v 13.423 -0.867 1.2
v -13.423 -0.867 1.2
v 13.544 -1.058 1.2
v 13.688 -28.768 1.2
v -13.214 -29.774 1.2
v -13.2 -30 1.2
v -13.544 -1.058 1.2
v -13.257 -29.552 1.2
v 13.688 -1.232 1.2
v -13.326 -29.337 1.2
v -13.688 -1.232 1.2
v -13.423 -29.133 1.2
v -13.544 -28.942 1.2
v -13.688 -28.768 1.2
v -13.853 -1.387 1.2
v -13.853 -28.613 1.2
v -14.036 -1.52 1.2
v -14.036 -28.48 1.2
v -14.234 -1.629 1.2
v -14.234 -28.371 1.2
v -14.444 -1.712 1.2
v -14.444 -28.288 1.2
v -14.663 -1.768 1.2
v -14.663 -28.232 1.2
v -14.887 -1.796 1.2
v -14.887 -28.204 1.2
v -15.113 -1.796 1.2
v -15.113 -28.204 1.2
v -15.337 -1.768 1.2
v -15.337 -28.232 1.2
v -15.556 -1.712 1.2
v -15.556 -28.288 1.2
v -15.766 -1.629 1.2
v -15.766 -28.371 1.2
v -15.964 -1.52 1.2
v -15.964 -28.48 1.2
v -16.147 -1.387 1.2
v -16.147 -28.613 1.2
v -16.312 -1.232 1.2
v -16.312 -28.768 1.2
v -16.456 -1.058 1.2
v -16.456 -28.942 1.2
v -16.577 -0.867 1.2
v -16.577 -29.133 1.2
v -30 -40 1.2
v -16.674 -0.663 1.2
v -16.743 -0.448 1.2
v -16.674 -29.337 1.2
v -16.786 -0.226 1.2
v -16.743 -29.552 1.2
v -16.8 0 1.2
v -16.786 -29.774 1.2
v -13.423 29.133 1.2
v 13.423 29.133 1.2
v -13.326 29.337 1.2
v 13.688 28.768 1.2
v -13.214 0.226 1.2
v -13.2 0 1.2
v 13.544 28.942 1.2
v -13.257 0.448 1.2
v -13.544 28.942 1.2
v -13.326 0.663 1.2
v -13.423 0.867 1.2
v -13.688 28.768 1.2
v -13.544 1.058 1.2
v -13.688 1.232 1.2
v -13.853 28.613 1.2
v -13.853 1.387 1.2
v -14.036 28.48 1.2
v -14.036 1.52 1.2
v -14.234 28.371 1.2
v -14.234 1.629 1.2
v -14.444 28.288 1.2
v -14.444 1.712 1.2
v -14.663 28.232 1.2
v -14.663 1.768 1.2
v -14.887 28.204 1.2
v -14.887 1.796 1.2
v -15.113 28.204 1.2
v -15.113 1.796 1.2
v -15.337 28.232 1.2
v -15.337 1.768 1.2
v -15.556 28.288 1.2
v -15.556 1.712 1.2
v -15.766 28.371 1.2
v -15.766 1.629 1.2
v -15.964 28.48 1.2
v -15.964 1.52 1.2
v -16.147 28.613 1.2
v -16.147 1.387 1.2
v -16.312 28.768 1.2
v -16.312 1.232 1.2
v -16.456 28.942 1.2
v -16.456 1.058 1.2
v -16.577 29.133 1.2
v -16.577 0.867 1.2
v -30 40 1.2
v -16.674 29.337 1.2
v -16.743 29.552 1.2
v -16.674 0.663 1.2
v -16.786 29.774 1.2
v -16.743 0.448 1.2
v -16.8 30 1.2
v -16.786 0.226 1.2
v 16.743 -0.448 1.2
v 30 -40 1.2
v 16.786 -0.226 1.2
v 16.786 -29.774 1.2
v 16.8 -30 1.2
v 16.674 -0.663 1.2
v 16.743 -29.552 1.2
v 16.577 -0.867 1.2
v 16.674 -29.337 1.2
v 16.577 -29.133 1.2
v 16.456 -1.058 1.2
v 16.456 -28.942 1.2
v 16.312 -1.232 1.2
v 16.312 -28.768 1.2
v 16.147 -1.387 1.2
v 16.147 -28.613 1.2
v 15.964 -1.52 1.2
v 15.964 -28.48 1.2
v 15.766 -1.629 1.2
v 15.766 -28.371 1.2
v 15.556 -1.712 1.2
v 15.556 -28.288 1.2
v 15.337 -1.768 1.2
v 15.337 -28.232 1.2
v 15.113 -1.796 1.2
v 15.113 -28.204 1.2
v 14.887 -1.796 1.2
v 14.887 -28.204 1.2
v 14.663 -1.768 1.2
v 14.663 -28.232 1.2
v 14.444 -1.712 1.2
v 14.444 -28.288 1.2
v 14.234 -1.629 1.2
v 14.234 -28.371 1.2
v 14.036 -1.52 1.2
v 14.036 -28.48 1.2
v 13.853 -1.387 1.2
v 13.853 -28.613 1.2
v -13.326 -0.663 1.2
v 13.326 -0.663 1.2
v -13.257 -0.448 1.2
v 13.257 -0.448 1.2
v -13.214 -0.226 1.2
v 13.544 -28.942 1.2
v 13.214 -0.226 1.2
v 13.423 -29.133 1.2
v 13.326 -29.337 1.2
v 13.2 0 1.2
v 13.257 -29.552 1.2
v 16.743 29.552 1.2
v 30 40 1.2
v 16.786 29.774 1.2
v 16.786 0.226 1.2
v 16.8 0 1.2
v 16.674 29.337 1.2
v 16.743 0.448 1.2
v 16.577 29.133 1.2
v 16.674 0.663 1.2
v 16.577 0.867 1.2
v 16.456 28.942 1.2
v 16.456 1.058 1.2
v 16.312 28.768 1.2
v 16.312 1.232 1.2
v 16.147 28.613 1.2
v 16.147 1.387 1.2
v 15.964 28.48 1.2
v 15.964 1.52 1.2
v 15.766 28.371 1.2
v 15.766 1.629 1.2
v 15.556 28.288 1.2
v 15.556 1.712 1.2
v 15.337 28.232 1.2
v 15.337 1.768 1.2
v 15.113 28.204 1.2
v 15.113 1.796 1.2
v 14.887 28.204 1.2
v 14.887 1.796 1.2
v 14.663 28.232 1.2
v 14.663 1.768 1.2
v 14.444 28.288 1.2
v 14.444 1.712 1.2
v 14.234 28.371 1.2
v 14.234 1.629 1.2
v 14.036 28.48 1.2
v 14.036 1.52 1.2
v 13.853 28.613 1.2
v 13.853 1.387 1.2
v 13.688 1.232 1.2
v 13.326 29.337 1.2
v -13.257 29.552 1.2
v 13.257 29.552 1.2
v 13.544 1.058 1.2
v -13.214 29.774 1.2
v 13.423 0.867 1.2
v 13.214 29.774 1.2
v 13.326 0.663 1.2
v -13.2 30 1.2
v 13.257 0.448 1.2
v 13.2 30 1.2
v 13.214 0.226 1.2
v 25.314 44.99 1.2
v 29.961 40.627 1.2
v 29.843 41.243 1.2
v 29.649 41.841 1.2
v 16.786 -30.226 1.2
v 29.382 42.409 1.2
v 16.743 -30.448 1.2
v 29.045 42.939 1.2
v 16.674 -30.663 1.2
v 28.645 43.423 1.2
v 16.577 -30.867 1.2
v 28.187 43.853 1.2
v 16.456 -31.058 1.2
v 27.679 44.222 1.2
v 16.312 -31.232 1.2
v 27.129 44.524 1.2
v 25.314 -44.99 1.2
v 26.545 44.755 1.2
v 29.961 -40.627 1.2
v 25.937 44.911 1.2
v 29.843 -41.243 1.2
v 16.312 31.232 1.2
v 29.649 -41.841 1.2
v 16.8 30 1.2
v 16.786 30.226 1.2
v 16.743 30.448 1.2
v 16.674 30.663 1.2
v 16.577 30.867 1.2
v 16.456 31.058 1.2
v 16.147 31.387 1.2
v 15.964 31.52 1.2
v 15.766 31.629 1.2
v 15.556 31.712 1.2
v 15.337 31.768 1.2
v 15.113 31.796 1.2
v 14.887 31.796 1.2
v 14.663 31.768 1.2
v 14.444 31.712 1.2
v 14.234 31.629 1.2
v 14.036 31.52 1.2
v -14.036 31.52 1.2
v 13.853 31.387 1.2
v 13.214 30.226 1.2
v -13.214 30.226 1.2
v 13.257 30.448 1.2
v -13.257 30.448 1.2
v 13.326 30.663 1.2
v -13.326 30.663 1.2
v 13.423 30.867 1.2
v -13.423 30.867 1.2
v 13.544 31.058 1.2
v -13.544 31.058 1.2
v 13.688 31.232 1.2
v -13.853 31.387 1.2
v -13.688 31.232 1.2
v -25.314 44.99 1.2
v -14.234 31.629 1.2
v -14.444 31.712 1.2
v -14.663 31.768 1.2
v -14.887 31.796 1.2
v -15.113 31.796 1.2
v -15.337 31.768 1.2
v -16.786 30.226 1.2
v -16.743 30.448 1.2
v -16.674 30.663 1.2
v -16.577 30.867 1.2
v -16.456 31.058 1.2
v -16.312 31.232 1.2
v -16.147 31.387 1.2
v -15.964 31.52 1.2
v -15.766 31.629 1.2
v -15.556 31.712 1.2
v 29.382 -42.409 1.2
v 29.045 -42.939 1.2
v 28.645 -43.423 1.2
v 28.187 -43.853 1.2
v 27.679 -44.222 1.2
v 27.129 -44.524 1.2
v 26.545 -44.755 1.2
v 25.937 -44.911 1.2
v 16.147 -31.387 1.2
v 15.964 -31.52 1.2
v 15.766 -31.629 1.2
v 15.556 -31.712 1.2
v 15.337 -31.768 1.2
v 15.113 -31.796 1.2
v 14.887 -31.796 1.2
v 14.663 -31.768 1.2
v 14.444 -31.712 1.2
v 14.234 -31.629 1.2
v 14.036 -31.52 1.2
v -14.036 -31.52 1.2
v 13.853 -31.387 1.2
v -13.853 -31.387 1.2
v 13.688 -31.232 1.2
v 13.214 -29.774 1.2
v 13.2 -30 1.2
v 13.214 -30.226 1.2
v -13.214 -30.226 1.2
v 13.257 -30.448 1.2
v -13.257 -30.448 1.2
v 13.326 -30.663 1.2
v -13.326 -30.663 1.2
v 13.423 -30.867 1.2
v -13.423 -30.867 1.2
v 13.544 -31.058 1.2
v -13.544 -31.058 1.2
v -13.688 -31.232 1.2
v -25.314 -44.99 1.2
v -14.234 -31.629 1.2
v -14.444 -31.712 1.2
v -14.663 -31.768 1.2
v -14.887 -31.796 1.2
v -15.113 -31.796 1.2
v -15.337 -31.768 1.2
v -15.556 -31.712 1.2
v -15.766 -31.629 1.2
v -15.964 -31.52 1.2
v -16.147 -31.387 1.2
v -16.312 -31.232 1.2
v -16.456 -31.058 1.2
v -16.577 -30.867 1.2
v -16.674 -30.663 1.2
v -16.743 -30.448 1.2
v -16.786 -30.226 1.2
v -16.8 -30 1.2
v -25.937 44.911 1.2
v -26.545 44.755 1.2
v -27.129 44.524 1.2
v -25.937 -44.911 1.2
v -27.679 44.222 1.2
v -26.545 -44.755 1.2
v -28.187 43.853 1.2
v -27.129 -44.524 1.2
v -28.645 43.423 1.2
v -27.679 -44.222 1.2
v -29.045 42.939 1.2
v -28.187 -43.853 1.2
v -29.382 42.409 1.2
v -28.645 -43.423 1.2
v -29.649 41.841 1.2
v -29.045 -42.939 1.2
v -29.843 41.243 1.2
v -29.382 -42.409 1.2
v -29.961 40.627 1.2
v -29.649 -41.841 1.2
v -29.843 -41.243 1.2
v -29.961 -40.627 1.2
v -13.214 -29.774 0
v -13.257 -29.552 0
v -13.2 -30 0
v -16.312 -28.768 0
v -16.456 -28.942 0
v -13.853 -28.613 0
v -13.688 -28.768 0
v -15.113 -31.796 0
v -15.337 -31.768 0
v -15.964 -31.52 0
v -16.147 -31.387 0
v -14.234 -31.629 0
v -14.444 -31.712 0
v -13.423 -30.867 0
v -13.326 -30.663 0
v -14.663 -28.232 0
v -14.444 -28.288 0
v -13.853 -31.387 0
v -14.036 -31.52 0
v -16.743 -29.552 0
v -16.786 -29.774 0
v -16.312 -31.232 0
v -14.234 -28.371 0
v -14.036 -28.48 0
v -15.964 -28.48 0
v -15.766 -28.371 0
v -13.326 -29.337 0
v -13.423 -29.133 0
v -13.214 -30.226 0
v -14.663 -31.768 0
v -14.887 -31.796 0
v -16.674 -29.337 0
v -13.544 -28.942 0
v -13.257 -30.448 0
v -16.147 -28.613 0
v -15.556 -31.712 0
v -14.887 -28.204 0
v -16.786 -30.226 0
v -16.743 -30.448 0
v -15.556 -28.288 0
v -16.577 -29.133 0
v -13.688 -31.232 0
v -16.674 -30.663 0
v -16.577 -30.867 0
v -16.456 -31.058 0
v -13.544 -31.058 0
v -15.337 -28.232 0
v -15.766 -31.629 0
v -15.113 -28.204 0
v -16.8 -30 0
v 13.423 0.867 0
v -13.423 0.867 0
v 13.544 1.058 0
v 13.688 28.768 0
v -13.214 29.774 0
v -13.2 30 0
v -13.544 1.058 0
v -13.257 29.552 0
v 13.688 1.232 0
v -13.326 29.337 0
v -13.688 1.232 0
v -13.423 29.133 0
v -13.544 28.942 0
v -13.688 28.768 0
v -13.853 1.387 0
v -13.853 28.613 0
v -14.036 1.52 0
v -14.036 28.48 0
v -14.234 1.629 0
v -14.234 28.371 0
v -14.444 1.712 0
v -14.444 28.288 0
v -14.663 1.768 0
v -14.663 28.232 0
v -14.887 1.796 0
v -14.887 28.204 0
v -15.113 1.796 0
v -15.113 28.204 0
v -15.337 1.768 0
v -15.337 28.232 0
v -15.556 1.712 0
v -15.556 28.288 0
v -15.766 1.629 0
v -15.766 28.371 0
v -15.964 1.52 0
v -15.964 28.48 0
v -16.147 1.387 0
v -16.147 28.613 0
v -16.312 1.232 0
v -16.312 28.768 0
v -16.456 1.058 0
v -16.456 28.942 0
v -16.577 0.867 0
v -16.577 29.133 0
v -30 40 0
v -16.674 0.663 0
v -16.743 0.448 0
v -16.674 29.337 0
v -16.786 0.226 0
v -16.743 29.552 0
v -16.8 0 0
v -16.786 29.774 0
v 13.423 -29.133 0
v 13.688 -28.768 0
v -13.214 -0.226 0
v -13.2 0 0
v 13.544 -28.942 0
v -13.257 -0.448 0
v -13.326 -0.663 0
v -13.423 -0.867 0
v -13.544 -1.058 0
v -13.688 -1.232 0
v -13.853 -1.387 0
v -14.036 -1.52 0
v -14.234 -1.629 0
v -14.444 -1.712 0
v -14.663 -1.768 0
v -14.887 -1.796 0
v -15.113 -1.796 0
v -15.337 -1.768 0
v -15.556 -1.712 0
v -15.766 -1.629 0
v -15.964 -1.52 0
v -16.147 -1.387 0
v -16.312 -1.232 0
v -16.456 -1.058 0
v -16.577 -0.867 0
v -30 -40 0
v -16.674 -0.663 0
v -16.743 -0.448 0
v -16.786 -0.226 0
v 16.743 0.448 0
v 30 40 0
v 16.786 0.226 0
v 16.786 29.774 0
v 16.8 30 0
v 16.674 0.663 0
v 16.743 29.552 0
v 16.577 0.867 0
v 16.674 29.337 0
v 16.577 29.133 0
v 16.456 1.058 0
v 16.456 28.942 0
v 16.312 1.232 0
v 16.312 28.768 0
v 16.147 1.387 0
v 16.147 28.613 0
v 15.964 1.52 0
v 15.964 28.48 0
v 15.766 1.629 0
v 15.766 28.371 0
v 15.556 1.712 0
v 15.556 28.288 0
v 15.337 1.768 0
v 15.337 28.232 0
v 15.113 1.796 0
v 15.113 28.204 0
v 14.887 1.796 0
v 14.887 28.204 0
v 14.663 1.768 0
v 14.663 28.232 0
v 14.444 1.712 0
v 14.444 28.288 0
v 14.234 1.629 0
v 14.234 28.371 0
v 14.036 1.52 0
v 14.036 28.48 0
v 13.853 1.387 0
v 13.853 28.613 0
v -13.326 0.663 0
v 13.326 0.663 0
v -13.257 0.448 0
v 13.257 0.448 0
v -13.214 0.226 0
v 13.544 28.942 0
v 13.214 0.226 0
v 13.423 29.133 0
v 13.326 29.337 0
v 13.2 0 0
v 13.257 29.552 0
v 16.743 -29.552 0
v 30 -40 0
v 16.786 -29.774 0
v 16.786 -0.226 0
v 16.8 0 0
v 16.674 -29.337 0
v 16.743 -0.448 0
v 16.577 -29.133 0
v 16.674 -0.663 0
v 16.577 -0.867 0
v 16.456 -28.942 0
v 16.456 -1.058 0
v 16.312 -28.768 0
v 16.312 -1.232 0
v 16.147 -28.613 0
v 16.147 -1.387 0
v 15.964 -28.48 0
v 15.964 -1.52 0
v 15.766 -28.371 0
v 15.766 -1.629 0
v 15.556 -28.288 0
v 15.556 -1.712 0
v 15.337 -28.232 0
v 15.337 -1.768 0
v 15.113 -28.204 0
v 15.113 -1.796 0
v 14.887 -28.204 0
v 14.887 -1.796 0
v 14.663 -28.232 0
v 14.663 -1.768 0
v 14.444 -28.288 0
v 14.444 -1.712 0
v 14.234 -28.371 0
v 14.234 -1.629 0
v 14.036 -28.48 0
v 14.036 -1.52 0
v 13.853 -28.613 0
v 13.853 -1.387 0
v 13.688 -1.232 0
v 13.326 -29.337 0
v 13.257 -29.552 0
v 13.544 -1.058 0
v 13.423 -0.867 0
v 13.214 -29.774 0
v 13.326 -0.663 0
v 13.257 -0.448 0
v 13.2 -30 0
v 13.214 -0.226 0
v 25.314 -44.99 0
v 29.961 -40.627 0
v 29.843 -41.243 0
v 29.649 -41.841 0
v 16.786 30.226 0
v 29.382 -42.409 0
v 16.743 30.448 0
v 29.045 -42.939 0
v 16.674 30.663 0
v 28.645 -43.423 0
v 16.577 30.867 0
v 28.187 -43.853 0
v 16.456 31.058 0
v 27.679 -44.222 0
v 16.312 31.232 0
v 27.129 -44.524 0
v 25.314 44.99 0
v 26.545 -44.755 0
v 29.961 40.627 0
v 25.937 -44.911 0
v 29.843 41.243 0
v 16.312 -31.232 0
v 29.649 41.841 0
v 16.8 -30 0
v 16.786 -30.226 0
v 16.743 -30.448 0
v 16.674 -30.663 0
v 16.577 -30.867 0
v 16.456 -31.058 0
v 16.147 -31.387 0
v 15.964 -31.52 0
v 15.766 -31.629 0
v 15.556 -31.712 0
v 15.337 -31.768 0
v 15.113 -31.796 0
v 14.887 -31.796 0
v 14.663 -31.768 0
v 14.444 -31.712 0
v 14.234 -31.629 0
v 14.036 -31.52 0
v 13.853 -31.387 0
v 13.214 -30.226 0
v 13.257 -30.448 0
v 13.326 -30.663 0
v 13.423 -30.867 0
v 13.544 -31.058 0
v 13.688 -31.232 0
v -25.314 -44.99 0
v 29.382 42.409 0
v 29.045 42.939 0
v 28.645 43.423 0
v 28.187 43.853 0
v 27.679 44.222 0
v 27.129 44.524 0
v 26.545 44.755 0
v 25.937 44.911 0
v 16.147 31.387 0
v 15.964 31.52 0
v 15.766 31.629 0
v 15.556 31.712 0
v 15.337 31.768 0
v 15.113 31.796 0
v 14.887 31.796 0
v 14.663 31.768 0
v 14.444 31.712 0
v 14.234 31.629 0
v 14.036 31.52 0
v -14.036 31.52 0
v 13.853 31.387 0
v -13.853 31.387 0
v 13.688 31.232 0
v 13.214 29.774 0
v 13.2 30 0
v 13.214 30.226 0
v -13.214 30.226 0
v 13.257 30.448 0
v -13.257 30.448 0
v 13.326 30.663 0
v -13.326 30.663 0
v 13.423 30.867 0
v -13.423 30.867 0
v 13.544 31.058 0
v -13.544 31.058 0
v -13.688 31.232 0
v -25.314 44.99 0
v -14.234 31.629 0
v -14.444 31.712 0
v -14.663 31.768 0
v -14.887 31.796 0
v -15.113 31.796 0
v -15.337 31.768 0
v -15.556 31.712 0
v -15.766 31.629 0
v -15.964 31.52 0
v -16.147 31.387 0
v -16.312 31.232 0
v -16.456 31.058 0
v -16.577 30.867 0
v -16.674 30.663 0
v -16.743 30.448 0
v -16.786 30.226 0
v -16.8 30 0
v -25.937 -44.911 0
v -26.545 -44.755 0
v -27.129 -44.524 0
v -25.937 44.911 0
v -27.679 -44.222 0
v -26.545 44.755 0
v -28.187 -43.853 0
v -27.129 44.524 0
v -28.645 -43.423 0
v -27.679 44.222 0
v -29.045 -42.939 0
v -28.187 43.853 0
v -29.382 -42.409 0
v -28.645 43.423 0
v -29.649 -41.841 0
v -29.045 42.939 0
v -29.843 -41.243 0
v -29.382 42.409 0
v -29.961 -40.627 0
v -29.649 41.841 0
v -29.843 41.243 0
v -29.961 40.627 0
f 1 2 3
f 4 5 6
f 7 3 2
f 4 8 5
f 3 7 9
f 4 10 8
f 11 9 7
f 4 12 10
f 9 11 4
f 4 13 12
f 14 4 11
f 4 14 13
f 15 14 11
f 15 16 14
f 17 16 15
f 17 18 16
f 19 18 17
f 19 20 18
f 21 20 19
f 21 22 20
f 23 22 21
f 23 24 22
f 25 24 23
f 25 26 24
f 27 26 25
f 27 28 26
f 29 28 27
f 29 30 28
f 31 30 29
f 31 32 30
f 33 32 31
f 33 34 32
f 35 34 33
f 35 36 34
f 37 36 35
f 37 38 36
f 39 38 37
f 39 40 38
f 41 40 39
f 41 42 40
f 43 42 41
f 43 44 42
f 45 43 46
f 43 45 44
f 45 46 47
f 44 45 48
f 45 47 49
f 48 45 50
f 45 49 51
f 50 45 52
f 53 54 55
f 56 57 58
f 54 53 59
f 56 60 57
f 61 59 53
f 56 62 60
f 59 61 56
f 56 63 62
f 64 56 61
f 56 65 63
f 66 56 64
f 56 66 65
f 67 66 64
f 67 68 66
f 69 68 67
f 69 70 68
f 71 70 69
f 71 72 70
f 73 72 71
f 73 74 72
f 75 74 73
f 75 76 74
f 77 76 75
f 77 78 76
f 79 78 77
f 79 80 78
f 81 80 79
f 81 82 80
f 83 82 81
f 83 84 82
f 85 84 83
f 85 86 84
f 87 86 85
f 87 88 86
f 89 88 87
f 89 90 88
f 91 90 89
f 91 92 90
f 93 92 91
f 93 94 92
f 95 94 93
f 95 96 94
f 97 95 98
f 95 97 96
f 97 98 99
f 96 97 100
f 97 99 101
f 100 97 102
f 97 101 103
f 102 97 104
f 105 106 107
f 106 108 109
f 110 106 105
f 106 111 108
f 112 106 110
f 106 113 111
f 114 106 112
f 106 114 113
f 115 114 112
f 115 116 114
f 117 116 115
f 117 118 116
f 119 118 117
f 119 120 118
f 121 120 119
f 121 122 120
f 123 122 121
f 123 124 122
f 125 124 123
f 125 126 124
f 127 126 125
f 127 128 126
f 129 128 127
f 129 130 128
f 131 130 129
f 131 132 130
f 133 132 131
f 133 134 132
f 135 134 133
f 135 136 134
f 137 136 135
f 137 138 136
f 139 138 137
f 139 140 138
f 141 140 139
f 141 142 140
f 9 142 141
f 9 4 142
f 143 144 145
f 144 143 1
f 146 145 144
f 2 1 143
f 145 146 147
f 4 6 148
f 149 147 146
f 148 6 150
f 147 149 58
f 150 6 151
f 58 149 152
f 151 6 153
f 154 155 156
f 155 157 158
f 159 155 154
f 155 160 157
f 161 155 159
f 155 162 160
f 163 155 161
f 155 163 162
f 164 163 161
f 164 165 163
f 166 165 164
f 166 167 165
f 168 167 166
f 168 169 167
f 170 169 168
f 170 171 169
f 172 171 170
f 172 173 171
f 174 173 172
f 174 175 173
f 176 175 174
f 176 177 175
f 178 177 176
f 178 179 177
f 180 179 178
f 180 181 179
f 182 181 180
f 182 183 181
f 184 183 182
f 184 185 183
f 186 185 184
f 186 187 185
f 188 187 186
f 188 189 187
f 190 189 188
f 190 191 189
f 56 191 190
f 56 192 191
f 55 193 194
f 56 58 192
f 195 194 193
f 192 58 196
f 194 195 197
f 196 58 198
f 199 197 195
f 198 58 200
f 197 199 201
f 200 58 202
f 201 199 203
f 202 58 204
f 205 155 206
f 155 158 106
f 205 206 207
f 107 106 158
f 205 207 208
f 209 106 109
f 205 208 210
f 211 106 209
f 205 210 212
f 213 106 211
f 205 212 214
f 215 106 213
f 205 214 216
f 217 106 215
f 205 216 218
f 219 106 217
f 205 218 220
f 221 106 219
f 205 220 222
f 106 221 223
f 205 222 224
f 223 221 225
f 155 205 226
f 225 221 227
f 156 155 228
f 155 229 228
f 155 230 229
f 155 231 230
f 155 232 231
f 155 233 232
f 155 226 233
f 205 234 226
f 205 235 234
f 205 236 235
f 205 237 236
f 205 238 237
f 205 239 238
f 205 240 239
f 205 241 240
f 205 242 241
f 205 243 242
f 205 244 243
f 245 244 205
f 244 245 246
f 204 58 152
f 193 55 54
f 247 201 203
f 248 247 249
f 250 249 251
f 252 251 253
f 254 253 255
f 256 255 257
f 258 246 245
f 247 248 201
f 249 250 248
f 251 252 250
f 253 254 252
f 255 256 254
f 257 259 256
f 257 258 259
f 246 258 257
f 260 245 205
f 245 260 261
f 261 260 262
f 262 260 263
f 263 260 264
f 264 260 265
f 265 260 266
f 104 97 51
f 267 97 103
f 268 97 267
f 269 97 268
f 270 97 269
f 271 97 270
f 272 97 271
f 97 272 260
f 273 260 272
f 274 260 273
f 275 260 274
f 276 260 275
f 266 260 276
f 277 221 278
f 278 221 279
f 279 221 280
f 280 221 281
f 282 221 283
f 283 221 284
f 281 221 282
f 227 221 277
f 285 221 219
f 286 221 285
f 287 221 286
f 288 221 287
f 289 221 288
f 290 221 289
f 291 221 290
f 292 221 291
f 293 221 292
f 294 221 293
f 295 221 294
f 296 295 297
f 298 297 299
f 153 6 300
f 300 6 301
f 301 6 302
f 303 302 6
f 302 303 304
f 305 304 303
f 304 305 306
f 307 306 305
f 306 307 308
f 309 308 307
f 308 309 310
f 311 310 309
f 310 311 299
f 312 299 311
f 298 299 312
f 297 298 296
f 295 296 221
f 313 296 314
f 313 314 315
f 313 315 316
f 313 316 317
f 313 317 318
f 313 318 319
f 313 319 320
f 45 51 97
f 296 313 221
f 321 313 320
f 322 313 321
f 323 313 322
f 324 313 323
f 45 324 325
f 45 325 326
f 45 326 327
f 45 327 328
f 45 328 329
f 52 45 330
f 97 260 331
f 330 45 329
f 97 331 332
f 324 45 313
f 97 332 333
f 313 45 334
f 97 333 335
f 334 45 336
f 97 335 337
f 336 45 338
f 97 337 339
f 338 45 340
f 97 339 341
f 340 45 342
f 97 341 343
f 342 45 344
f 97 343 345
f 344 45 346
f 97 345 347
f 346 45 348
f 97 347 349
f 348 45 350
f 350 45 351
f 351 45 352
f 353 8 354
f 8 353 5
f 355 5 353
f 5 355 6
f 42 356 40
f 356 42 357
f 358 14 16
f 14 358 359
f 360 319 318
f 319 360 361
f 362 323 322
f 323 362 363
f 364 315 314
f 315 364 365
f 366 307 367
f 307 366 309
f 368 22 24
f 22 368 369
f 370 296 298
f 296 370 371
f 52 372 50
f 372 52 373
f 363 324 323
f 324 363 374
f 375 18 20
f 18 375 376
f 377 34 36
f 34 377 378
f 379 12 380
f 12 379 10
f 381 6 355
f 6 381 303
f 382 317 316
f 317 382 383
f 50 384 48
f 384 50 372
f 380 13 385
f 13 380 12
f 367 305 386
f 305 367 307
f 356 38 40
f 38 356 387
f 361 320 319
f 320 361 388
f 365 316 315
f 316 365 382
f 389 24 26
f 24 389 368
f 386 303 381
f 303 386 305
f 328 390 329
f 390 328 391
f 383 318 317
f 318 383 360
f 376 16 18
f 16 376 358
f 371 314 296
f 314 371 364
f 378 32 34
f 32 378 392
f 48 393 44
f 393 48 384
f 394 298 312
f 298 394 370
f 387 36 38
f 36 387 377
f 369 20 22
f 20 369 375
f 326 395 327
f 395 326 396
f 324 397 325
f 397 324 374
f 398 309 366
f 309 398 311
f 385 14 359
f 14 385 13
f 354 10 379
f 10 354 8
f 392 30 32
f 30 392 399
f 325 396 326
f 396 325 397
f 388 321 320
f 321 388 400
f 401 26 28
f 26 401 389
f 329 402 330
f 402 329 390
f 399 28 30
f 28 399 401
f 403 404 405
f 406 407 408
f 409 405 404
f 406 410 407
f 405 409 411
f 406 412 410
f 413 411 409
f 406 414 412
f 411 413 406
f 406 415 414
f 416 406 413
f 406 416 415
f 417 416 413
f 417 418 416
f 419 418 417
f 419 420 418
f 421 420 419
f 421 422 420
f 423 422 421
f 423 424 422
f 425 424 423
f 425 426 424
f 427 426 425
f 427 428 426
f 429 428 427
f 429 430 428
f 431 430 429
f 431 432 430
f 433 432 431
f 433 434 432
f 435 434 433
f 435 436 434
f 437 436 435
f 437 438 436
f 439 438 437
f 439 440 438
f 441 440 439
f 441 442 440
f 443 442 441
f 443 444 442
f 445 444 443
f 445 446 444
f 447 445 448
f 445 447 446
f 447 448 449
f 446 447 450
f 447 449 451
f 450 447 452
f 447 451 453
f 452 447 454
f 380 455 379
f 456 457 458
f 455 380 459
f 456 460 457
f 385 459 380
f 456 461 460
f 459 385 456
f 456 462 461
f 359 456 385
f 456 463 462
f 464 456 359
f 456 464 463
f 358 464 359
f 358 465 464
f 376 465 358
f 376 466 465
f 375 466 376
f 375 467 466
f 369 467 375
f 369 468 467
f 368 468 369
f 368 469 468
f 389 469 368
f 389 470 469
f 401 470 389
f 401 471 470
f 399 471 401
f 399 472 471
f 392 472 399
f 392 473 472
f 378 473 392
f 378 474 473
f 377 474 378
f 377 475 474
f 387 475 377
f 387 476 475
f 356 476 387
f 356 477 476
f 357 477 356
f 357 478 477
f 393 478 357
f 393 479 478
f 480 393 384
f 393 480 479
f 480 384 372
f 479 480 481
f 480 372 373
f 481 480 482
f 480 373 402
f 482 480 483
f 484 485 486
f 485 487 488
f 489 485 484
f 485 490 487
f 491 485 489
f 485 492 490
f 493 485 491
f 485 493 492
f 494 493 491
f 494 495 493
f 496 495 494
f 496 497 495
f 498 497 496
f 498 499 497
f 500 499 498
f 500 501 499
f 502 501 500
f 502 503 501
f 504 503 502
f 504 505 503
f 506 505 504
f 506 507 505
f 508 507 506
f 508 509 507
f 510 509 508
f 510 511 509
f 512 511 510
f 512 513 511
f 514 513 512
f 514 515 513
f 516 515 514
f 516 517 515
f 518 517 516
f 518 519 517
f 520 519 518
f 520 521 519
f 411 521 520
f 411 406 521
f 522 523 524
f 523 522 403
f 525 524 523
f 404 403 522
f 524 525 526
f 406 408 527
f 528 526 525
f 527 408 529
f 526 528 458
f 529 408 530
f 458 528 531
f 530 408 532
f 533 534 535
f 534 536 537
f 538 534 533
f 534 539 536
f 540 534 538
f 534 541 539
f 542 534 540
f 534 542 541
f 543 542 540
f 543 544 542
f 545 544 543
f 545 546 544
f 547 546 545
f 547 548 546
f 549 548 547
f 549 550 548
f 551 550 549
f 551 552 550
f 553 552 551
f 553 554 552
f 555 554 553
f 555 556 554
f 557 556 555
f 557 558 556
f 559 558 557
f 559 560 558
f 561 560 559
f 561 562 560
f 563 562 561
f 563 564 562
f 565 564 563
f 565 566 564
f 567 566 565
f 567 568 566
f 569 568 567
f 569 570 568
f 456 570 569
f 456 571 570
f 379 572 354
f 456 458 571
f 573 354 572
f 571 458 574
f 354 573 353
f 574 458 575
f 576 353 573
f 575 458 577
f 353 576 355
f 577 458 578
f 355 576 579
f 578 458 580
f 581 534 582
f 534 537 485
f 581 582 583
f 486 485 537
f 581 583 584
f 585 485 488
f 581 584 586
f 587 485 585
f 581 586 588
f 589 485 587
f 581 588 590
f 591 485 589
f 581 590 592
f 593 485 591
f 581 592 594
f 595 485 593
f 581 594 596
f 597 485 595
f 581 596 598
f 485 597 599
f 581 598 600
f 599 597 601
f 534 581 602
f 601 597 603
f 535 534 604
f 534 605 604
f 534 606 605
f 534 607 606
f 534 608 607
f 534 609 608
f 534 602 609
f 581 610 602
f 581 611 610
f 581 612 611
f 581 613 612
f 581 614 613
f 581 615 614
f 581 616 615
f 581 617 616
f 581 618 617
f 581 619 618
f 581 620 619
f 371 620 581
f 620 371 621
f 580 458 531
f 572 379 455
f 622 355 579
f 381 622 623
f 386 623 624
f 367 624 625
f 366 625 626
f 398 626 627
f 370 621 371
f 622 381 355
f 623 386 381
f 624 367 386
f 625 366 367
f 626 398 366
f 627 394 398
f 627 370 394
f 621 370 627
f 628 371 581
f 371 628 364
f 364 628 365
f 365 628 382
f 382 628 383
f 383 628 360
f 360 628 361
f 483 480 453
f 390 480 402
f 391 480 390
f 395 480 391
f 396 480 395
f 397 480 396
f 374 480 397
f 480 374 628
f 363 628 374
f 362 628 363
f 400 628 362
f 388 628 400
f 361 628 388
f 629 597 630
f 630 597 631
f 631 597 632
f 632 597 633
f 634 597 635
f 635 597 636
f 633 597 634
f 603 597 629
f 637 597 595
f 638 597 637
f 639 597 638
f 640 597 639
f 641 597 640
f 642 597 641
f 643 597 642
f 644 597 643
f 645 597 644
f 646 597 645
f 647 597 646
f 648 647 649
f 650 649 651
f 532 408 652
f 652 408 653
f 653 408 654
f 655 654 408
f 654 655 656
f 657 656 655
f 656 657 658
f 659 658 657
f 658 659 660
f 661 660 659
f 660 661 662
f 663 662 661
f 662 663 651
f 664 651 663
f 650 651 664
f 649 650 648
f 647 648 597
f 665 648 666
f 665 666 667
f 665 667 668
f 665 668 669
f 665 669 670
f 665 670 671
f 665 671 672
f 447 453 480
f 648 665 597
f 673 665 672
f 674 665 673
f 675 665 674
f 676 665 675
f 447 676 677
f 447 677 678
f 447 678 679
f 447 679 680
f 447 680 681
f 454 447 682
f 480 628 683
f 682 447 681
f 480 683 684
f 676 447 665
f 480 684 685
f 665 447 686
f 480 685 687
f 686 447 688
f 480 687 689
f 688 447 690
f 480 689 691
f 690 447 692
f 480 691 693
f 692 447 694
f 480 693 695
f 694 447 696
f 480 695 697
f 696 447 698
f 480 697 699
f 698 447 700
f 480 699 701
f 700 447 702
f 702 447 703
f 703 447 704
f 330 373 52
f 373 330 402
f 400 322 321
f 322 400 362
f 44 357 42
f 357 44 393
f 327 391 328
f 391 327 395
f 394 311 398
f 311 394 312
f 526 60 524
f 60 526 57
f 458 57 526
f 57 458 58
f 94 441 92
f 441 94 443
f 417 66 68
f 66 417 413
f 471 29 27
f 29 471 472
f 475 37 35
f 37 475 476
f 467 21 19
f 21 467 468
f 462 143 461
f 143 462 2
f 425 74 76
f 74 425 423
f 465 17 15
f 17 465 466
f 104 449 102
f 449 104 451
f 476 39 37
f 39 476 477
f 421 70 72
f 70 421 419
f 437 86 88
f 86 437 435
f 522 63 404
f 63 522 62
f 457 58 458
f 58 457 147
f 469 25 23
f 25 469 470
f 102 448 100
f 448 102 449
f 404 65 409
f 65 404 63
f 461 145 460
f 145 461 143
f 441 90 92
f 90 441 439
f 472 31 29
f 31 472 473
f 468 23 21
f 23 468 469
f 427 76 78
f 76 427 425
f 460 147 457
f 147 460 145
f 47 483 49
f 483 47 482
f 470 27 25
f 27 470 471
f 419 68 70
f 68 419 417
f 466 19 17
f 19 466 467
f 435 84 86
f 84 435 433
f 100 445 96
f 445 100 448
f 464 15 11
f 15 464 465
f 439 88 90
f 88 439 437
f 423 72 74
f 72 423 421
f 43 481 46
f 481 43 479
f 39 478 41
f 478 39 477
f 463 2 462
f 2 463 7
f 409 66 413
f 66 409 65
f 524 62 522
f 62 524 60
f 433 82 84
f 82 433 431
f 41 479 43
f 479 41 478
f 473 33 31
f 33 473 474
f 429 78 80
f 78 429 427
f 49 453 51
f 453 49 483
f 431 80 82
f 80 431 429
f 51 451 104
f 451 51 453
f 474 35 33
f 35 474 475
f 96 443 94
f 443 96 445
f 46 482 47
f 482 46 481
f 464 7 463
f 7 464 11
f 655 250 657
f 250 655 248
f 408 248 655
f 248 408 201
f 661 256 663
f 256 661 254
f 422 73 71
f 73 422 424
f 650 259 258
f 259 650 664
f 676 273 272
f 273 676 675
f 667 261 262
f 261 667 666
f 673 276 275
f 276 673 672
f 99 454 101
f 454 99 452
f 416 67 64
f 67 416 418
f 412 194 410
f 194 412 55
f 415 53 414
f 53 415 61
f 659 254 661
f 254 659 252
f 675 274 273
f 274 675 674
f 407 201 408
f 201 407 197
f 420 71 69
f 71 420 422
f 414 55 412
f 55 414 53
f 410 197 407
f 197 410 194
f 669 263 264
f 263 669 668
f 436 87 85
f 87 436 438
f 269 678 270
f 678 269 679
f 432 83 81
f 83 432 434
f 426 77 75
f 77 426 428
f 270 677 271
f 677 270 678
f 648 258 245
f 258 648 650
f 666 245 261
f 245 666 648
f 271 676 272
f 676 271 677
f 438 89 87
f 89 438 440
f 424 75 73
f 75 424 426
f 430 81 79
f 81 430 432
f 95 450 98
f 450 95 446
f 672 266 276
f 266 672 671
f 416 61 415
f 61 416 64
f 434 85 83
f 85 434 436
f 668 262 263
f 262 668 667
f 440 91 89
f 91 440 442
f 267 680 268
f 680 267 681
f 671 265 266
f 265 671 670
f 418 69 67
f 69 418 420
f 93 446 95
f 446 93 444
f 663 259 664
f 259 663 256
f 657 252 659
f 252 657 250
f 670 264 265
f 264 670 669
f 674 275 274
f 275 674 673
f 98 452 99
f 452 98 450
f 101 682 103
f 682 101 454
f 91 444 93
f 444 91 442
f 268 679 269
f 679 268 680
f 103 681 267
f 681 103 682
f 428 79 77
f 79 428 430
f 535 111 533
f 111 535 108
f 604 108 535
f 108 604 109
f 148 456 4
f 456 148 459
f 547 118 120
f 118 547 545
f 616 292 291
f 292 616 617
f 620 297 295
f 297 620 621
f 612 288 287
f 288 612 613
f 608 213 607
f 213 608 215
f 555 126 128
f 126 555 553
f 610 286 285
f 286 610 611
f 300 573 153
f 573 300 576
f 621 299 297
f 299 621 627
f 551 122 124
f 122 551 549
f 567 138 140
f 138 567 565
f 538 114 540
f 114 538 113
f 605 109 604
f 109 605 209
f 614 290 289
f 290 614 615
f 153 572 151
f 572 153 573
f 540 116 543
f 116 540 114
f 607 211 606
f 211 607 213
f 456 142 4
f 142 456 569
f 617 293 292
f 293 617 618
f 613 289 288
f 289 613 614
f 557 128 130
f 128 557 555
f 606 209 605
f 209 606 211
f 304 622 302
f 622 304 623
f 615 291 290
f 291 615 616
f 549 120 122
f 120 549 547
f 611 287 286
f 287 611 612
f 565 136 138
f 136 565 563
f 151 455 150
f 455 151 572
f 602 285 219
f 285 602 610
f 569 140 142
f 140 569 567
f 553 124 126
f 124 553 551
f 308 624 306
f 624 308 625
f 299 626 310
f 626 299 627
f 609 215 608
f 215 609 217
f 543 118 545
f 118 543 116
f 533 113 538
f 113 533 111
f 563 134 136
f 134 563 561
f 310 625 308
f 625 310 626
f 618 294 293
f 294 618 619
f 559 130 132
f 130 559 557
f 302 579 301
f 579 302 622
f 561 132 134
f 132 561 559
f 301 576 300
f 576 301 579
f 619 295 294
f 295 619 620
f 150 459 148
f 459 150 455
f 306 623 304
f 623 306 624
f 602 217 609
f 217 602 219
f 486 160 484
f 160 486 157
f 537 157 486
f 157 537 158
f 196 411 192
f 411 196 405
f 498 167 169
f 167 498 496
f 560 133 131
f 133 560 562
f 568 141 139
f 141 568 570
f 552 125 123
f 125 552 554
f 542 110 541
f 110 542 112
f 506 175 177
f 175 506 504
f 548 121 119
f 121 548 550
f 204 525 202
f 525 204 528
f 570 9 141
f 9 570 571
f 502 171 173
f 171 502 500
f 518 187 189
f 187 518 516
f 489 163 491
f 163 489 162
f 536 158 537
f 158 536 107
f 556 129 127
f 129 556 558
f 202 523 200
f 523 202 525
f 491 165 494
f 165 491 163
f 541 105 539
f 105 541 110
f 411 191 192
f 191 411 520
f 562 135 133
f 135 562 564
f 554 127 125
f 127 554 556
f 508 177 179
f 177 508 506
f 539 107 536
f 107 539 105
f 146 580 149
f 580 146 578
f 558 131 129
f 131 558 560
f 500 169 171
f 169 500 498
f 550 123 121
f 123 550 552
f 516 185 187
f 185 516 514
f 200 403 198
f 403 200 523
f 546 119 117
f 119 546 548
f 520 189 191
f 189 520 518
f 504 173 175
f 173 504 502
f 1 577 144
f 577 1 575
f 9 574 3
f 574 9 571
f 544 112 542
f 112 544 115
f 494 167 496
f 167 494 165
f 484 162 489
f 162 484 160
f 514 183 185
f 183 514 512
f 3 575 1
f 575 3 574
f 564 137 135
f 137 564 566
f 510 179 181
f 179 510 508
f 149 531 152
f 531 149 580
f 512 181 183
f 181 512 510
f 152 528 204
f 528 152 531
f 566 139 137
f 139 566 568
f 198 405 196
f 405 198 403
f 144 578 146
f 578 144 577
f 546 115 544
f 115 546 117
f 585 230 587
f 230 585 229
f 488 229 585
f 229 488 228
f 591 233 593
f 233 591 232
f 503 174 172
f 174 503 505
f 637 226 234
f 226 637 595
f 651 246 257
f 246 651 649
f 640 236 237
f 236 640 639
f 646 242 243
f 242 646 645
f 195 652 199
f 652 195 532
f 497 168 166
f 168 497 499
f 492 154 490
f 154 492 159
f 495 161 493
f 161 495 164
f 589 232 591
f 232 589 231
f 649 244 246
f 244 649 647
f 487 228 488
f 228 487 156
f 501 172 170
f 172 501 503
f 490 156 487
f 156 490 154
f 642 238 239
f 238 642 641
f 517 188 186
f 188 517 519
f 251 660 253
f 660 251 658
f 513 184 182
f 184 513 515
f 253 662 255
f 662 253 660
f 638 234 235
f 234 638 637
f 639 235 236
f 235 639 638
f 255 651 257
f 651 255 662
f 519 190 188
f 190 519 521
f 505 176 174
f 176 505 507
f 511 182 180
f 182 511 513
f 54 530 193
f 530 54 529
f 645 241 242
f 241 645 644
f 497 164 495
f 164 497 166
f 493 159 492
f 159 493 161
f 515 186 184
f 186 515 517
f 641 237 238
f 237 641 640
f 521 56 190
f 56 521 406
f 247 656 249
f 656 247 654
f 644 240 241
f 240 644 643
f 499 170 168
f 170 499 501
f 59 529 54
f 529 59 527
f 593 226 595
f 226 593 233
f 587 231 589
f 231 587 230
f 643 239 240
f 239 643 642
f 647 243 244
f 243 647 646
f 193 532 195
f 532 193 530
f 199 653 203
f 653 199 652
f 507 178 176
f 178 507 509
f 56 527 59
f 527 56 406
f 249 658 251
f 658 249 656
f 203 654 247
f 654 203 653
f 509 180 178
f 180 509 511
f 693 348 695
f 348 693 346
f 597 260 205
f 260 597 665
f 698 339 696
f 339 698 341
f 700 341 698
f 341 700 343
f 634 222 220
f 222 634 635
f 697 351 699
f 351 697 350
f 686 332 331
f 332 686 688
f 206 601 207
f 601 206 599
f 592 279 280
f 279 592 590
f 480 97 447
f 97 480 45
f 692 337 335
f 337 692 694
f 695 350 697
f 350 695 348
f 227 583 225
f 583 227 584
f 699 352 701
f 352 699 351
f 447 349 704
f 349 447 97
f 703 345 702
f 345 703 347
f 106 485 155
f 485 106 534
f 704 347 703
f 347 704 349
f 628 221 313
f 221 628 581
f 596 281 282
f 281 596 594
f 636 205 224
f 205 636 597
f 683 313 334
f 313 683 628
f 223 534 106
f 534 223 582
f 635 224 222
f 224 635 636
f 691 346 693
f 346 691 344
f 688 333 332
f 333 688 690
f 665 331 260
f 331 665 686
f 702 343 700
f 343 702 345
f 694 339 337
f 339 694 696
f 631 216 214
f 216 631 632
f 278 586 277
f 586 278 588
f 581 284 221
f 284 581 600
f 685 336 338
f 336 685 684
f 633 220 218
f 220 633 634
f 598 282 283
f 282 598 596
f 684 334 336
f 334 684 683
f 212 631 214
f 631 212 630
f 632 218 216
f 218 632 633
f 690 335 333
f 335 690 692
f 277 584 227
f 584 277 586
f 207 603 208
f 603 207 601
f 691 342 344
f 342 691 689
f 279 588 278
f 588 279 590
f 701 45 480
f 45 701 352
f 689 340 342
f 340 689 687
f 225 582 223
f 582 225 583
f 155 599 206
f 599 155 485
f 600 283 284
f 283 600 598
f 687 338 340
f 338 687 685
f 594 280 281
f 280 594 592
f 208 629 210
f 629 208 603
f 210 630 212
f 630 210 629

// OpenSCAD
$fn = 50;


difference() {
	union() {
		hull() {
			translate(v = [-25.0000000000, 40.0000000000, 0]) {
				cylinder(h = 30, r = 5);
			}
			translate(v = [25.0000000000, 40.0000000000, 0]) {
				cylinder(h = 30, r = 5);
			}
			translate(v = [-25.0000000000, -40.0000000000, 0]) {
				cylinder(h = 30, r = 5);
			}
			translate(v = [25.0000000000, -40.0000000000, 0]) {
				cylinder(h = 30, r = 5);
			}
		}
	}
	union() {
		translate(v = [0, 0, 1.2000000000]) {
			hull() {
				translate(v = [-25.0000000000, 40.0000000000, 0]) {
					cylinder(h = 28.8000000000, r = 3.8000000000);
				}
				translate(v = [25.0000000000, 40.0000000000, 0]) {
					cylinder(h = 28.8000000000, r = 3.8000000000);
				}
				translate(v = [-25.0000000000, -40.0000000000, 0]) {
					cylinder(h = 28.8000000000, r = 3.8000000000);
				}
				translate(v = [25.0000000000, -40.0000000000, 0]) {
					cylinder(h = 28.8000000000, r = 3.8000000000);
				}
			}
		}
		#translate(v = [-15.0000000000, -30.0000000000, 0]) {
			cylinder(h = 1.2000000000, r = 1.8000000000);
		}
		#translate(v = [-15.0000000000, 0.0000000000, 0]) {
			cylinder(h = 1.2000000000, r = 1.8000000000);
		}
		#translate(v = [-15.0000000000, 30.0000000000, 0]) {
			cylinder(h = 1.2000000000, r = 1.8000000000);
		}
		#translate(v = [15.0000000000, -30.0000000000, 0]) {
			cylinder(h = 1.2000000000, r = 1.8000000000);
		}
		#translate(v = [15.0000000000, 0.0000000000, 0]) {
			cylinder(h = 1.2000000000, r = 1.8000000000);
		}
		#translate(v = [15.0000000000, 30.0000000000, 0]) {
			cylinder(h = 1.2000000000, r = 1.8000000000);
		}
		translate(v = [-250.0000000000, -250.0000000000, 1.2000000000]) {
			cube(size = [500, 500, 500]);
		}
		translate(v = [-250.0000000000, -250.0000000000, 1.2000000000]) {
			cube(size = [500, 500, 500]);
		}
		translate(v = [-250.0000000000, -250.0000000000, 1.2000000000]) {
			cube(size = [500, 500, 500]);
		}
	}
}
